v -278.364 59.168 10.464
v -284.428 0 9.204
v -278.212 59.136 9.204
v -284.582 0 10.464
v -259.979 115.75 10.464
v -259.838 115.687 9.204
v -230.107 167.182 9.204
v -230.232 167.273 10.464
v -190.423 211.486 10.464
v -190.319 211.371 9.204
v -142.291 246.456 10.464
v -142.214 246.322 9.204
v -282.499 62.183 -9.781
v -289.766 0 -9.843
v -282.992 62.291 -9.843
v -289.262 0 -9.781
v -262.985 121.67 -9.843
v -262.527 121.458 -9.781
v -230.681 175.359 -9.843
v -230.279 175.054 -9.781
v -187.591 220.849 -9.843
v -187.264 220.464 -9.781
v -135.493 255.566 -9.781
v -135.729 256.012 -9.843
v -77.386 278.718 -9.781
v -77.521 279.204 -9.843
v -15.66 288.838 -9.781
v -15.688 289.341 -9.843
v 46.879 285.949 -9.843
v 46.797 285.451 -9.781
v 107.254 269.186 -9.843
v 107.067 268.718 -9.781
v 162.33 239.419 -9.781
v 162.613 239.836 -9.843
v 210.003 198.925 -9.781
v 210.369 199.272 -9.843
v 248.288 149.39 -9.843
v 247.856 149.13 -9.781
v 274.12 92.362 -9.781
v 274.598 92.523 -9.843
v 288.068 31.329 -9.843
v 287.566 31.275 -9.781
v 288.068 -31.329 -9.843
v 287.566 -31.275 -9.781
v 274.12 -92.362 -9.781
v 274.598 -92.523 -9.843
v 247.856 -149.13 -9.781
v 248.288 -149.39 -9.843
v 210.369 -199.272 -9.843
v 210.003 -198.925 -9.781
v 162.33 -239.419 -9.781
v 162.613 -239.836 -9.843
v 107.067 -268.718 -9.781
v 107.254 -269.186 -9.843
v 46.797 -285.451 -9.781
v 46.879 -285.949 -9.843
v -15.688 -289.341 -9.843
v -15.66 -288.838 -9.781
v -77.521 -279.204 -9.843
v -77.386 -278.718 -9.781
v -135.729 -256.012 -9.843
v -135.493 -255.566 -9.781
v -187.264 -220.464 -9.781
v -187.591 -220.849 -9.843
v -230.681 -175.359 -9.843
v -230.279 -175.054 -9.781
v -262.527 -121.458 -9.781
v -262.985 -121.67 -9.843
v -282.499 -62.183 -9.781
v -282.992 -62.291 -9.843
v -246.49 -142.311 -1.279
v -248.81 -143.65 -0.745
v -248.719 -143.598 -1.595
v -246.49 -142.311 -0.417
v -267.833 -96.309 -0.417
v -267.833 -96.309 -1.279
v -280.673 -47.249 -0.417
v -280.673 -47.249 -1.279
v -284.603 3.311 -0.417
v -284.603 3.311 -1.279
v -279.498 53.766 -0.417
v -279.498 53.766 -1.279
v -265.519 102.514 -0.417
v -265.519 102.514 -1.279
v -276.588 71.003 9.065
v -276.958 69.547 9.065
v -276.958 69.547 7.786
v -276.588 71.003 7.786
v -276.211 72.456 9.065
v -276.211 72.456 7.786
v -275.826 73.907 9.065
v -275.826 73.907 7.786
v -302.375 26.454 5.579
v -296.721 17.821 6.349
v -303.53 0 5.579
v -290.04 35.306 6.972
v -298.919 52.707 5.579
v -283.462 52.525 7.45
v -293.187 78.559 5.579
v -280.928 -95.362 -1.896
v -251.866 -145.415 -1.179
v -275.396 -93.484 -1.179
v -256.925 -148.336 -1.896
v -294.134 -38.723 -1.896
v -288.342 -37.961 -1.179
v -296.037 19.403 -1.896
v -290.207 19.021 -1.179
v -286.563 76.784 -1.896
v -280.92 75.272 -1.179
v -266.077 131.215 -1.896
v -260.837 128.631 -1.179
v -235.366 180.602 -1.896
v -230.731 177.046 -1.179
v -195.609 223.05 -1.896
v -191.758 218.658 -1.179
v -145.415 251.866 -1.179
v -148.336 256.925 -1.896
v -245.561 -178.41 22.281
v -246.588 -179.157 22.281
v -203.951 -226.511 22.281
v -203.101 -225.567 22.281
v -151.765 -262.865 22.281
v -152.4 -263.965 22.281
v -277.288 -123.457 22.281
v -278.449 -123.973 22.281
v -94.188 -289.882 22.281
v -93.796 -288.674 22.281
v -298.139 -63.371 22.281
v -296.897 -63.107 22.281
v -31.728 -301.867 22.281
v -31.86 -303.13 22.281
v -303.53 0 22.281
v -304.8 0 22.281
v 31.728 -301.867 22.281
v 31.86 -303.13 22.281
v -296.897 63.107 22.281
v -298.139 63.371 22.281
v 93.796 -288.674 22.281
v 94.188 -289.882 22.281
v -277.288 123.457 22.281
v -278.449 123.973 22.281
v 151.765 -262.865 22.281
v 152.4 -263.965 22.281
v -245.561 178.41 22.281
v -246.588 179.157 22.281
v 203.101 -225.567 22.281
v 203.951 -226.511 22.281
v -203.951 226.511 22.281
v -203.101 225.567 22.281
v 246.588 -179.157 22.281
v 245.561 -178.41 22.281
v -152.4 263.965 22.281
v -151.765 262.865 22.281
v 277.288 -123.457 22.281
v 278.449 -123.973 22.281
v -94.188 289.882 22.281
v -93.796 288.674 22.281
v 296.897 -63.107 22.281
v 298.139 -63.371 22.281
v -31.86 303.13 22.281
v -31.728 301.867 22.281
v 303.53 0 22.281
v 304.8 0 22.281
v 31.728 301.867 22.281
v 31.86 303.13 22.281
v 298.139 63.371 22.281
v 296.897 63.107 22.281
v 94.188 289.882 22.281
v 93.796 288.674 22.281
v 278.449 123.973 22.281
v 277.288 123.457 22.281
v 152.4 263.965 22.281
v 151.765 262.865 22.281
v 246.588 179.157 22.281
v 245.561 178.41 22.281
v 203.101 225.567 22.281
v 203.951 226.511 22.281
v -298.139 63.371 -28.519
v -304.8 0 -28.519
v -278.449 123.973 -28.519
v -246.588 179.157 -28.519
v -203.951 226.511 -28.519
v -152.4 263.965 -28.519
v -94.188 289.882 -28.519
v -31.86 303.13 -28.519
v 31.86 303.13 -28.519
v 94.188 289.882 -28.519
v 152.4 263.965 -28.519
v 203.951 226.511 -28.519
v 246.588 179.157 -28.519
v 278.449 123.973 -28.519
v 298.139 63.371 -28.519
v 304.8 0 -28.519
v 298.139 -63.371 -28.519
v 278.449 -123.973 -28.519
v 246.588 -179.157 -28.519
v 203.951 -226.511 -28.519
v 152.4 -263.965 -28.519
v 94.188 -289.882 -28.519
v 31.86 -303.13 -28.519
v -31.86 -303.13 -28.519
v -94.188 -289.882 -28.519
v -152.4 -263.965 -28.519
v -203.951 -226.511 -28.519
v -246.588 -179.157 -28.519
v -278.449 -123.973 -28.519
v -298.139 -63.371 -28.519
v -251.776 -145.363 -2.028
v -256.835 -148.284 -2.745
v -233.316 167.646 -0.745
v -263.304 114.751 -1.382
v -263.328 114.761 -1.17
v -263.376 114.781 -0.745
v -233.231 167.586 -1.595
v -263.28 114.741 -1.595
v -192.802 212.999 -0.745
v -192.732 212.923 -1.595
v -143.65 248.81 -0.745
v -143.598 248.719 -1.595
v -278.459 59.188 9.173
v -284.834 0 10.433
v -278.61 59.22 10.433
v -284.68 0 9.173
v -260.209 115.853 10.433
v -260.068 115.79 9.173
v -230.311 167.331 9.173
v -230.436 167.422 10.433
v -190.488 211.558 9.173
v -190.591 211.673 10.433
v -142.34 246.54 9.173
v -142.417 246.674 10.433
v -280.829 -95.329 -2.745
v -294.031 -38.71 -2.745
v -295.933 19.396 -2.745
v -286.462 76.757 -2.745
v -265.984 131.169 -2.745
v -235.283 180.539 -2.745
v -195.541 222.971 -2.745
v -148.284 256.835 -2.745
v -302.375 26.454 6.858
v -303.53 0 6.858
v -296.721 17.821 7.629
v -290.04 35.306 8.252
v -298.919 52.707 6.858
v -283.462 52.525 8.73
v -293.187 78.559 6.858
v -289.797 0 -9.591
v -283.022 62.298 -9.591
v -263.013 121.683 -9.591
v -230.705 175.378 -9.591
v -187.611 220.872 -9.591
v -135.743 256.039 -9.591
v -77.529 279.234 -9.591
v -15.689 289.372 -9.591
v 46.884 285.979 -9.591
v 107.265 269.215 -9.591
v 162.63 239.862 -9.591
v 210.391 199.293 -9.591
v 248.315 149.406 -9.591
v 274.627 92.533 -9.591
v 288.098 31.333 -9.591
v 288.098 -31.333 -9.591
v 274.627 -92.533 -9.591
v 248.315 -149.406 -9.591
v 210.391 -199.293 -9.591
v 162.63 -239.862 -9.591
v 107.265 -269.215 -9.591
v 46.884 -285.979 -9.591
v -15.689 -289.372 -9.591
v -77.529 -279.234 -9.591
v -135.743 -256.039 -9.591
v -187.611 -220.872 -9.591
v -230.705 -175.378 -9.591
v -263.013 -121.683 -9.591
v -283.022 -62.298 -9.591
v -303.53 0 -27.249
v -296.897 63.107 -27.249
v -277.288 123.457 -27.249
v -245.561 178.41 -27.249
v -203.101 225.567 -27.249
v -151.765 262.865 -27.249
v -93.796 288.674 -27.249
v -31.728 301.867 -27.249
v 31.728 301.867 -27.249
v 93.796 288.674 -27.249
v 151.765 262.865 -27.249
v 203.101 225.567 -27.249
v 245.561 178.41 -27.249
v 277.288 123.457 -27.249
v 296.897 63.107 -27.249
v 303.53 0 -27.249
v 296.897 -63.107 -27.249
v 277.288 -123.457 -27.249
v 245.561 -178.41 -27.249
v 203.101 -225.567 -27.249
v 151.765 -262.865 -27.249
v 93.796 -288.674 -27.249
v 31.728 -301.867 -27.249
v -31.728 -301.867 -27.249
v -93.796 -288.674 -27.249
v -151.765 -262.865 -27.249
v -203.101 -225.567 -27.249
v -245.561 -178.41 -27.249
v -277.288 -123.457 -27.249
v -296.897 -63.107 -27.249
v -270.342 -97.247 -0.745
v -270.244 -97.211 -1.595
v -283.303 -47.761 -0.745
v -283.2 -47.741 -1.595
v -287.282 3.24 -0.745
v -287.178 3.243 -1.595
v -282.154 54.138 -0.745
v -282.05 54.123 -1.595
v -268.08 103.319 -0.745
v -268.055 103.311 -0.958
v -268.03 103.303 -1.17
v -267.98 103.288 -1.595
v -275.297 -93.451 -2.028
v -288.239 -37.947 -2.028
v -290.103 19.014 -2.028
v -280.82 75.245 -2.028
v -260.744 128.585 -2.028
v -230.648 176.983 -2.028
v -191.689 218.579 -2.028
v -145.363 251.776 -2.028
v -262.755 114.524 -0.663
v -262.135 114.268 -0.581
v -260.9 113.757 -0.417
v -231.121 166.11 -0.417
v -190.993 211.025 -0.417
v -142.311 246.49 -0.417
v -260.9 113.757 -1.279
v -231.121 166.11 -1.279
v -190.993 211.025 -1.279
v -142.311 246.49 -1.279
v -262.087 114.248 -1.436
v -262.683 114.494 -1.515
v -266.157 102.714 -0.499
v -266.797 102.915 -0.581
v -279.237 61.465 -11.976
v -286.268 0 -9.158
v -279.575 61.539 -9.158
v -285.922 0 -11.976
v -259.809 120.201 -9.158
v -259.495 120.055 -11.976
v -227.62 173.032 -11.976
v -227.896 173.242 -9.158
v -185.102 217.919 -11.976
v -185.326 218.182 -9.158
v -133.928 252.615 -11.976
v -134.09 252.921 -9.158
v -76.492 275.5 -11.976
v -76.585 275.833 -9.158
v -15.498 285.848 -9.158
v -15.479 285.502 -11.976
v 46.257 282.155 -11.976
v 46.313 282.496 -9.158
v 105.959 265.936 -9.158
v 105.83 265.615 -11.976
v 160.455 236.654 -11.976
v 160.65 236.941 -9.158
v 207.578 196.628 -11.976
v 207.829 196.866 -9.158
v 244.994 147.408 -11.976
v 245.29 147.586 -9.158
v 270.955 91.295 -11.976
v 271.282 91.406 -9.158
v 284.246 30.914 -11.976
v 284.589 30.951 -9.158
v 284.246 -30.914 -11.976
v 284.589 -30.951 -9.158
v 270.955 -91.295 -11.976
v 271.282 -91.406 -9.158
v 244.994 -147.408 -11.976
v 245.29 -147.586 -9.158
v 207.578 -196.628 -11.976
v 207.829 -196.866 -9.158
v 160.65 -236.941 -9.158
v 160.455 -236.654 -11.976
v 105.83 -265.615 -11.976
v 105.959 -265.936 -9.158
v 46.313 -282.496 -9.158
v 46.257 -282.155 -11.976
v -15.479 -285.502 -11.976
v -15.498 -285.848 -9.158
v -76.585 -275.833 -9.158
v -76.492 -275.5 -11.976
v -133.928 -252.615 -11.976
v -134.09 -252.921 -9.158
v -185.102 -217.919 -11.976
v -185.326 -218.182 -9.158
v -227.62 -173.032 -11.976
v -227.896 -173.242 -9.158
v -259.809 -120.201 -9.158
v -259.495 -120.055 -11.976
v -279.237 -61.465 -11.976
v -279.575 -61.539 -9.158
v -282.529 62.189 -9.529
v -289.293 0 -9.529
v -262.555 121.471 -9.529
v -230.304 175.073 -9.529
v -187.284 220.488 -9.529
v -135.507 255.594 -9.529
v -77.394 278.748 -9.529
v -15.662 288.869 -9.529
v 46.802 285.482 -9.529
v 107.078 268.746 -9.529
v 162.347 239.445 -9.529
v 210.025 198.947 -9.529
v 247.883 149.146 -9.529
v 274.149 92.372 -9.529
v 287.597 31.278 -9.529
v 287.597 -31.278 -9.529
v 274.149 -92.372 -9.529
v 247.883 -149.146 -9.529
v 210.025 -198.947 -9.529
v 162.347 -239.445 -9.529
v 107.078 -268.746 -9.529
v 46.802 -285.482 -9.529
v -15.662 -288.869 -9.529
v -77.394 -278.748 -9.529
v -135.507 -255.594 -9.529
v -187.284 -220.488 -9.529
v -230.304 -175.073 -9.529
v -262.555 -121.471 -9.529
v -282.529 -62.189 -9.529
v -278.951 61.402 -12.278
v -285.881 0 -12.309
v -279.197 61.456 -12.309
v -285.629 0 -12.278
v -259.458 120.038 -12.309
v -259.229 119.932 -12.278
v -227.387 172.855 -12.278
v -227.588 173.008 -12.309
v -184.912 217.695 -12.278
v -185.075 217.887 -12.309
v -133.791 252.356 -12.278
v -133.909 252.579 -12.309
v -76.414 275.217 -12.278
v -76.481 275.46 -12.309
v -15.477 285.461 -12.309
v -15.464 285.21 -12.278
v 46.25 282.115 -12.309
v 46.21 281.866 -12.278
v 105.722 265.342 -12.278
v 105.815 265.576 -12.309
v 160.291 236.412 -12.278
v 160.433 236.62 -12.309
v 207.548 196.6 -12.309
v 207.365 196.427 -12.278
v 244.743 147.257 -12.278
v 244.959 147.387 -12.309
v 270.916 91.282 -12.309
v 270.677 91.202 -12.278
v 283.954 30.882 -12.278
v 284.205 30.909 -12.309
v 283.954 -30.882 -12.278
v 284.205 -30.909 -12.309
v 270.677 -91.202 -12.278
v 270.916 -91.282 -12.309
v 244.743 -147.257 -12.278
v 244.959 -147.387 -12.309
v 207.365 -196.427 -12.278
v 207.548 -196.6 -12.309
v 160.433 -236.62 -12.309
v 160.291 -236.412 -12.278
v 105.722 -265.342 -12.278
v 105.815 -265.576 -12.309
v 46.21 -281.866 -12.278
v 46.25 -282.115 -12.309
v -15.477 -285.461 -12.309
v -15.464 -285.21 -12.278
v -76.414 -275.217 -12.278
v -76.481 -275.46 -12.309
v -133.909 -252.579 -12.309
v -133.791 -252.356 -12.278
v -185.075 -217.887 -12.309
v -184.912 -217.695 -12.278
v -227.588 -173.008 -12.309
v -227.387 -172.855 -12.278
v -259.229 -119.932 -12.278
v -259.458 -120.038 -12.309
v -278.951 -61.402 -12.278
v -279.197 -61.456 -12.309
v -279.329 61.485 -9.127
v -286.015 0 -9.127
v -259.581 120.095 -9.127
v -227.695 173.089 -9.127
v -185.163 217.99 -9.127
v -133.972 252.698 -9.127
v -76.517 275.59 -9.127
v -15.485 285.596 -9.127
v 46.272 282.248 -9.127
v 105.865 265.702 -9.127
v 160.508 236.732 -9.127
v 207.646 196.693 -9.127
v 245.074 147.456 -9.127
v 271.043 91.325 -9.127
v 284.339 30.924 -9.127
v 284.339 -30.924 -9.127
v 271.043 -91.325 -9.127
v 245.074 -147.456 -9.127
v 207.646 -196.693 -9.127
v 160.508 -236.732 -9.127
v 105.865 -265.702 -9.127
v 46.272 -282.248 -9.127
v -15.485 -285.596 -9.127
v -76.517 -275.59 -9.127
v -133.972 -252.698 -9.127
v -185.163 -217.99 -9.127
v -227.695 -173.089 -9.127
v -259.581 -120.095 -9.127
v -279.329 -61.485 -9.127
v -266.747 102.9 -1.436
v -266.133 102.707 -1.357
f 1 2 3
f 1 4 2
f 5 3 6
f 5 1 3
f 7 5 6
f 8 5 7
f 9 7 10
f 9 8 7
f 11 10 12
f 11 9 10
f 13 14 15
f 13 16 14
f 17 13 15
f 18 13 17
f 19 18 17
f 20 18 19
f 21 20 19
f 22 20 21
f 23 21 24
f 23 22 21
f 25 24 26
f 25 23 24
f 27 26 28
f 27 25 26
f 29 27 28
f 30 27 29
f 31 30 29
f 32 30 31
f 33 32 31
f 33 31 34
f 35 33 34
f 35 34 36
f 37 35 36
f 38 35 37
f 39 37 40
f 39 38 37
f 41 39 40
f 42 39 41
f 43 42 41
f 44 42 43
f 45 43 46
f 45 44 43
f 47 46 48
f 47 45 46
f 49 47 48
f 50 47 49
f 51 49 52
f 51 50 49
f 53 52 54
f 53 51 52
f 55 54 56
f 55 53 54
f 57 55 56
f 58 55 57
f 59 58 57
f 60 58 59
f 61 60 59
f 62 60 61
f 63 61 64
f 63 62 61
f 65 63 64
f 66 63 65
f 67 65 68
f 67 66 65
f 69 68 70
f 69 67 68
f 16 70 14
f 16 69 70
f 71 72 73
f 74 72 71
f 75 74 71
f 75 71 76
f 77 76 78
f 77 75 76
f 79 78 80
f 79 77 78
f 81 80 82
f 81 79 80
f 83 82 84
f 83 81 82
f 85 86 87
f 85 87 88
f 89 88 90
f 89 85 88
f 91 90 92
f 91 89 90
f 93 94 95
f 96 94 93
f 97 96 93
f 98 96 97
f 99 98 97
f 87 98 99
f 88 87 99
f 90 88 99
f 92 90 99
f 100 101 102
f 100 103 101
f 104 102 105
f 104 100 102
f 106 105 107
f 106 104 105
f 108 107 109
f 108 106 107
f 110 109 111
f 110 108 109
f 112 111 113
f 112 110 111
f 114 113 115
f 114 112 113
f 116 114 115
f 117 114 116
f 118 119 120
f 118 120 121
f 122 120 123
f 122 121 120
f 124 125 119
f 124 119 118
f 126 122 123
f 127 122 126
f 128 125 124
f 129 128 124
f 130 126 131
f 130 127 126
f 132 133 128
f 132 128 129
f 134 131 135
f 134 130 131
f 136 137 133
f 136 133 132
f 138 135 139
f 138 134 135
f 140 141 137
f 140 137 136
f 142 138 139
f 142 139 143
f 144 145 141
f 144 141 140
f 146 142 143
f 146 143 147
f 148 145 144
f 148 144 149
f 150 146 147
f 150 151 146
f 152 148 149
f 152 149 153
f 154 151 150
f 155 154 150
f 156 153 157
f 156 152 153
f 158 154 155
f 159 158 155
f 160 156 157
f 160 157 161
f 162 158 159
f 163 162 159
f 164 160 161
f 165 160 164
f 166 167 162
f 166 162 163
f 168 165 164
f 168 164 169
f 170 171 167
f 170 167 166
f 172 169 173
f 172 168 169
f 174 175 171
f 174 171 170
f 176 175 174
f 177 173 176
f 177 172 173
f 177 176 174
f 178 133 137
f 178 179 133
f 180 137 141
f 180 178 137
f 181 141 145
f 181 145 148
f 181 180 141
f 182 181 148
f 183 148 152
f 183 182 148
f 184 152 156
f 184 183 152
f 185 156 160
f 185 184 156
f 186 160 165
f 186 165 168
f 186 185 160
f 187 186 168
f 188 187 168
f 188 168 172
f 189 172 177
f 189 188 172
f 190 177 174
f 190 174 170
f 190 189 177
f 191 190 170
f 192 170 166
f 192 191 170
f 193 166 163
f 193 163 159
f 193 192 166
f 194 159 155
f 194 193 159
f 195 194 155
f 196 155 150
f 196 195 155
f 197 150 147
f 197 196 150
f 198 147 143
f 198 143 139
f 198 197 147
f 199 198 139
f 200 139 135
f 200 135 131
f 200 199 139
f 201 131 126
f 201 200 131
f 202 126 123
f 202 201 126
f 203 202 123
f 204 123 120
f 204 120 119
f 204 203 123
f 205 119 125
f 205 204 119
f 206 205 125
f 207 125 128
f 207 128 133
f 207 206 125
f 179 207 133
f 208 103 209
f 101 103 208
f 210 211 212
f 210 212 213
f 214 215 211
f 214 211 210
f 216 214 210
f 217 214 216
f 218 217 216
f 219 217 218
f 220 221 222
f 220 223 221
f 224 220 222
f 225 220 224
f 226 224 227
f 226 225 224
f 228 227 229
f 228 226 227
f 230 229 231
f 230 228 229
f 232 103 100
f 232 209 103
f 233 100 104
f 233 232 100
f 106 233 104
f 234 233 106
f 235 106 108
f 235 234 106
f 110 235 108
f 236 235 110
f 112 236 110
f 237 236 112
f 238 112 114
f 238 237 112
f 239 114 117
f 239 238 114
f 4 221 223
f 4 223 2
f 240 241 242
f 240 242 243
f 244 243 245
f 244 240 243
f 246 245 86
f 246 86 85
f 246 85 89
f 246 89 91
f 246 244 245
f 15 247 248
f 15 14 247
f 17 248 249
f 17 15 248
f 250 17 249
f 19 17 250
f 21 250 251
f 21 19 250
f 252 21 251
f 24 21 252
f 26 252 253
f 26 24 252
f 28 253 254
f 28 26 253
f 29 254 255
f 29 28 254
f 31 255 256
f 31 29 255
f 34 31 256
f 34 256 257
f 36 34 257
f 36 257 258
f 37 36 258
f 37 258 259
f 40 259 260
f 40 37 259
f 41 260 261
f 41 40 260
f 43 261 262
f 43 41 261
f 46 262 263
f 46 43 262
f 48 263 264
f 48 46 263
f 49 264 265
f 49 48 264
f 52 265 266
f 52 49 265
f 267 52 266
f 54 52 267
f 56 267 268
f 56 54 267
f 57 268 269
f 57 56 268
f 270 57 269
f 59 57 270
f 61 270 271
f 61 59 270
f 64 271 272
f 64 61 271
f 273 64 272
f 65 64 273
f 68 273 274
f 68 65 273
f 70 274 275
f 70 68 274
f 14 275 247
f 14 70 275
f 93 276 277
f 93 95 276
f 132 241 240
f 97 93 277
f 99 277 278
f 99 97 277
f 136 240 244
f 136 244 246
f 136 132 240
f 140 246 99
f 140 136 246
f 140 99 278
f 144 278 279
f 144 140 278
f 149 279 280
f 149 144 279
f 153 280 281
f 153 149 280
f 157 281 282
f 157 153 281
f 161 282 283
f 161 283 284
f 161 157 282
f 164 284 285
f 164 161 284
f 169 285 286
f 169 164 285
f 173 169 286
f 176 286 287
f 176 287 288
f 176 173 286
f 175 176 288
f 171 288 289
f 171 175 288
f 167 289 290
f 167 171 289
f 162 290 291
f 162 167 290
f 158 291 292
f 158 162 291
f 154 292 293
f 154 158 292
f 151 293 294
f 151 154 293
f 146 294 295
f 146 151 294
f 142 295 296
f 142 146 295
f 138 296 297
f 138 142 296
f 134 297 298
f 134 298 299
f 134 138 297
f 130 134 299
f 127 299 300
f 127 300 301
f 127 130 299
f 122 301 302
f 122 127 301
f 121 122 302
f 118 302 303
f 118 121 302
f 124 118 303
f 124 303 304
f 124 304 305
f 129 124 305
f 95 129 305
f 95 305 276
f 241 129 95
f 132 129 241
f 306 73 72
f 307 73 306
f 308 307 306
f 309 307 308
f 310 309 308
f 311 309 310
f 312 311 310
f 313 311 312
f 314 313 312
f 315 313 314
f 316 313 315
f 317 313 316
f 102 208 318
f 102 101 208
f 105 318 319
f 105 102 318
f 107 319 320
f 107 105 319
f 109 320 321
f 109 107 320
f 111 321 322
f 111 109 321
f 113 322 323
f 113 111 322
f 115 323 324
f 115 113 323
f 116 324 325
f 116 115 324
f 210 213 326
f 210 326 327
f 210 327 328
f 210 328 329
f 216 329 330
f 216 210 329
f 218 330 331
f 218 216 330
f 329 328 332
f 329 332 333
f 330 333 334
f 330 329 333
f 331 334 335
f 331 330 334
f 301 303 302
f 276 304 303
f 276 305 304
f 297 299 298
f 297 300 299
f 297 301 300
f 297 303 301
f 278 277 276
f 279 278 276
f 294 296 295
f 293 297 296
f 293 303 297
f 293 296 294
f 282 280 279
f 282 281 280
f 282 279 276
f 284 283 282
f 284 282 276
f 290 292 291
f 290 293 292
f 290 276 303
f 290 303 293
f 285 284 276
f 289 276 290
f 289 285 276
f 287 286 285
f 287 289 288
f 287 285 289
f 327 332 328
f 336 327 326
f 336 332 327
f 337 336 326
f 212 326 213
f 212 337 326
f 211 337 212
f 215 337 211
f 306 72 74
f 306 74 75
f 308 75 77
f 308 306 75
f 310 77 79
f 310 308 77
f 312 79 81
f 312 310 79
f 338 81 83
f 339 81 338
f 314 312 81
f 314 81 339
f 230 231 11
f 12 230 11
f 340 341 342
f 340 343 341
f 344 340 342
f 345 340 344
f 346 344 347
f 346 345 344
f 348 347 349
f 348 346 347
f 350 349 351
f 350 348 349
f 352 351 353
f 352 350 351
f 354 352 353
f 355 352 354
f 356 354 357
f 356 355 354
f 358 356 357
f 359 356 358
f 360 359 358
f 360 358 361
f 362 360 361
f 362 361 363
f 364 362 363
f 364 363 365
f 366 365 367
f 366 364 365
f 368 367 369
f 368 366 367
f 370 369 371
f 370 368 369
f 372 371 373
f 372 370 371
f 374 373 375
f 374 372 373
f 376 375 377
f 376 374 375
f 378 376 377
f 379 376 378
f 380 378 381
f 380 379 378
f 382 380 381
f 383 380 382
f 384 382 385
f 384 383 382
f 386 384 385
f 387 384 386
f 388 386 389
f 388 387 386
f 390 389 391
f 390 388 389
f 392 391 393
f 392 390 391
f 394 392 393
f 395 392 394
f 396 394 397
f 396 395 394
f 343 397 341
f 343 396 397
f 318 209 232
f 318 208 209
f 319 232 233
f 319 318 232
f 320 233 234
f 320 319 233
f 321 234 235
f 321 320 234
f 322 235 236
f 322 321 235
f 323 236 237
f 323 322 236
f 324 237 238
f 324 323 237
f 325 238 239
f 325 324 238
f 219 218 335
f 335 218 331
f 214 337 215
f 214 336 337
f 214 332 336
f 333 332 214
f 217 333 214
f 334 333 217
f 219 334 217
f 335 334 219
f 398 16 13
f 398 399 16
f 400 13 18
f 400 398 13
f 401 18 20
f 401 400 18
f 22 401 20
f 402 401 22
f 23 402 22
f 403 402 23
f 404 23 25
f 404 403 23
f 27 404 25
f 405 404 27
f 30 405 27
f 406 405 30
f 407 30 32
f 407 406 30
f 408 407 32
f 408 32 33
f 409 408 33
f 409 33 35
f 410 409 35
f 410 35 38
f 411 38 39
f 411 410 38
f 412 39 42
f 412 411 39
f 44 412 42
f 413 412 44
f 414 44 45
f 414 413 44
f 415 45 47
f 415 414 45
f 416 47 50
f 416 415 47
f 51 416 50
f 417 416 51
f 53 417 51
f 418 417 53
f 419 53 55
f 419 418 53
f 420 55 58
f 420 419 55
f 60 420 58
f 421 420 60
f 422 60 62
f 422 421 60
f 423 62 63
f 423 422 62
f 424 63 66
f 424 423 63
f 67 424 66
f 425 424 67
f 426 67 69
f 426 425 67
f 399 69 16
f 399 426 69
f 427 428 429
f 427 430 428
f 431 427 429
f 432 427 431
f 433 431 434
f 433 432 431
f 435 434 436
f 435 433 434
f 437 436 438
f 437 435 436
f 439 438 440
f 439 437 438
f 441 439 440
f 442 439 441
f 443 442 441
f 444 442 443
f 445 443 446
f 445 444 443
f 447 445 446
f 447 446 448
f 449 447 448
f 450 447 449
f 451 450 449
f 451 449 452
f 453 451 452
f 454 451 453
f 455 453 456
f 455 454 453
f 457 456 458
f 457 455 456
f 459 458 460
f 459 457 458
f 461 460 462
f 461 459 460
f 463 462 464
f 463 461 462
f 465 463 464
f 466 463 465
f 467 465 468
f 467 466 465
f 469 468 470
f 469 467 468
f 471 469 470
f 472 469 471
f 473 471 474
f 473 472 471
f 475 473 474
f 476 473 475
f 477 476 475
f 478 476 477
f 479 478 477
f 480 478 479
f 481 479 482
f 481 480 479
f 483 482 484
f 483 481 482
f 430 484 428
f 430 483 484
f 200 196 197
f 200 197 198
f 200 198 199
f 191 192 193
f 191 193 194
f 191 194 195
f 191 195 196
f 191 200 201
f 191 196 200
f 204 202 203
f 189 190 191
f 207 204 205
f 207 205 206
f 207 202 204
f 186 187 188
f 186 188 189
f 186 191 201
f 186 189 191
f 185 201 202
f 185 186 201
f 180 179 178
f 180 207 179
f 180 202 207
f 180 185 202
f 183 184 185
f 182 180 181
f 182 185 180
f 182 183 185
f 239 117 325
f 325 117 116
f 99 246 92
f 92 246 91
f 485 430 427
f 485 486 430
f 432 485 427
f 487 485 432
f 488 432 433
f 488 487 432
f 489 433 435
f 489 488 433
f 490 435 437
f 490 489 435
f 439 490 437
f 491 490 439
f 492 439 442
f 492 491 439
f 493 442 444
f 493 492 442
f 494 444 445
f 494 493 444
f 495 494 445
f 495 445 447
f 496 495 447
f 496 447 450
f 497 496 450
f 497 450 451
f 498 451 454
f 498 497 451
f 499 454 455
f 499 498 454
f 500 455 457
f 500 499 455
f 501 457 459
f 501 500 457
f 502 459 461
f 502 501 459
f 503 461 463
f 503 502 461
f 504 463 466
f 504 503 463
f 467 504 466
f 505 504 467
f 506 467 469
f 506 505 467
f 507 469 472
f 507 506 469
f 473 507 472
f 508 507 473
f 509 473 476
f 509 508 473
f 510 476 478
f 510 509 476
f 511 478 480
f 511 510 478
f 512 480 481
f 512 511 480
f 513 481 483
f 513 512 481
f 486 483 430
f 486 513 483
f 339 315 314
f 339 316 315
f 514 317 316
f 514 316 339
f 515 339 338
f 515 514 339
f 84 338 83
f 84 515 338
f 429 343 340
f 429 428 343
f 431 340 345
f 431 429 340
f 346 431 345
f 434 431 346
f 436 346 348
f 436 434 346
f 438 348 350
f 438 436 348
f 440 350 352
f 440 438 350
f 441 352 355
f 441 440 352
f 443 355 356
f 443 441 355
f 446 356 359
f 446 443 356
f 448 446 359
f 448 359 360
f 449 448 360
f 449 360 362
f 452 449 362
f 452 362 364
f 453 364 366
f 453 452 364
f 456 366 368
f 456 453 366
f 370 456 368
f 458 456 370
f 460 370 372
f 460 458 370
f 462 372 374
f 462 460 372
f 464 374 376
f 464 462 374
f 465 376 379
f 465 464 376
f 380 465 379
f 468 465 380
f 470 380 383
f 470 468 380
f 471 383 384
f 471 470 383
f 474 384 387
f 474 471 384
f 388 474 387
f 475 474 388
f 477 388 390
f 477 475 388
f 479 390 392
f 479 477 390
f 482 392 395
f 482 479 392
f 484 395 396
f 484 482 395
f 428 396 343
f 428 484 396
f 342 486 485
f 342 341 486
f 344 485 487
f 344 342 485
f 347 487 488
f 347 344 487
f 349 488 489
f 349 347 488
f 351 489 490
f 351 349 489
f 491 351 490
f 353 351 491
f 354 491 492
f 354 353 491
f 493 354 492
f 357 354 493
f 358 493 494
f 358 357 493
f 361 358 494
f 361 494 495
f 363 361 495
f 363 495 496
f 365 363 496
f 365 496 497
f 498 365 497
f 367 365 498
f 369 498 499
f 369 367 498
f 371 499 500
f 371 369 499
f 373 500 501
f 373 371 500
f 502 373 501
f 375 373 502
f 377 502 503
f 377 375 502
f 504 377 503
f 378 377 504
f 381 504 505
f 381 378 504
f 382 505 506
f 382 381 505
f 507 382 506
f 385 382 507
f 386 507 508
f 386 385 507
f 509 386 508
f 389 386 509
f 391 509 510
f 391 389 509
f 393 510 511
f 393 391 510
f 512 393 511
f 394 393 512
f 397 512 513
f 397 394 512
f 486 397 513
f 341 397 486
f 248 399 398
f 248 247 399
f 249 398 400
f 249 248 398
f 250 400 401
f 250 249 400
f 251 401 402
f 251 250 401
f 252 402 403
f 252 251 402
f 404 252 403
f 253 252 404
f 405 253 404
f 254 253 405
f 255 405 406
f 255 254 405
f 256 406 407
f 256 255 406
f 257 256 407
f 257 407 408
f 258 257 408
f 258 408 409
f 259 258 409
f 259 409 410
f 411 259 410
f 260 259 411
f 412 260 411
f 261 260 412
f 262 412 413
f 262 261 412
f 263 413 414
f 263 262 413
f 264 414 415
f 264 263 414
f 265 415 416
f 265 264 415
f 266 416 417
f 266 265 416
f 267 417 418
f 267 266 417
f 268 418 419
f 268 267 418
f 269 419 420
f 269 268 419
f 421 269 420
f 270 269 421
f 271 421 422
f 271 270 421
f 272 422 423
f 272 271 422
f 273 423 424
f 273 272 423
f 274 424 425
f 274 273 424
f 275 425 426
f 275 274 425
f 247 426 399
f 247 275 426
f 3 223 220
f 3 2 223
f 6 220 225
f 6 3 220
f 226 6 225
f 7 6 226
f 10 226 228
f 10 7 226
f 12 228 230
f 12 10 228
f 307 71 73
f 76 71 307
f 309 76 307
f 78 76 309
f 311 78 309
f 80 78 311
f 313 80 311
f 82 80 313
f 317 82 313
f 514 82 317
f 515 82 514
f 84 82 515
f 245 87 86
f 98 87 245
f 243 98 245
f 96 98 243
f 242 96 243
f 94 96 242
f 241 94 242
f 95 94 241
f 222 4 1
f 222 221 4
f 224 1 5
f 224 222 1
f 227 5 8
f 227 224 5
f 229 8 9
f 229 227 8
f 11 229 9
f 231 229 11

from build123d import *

# Parameters (mm, degrees)
F3_ANGLE_BACK = 30
F3_ANGLE      = 90
F5_ANGLE_BACK = 30
F5_ANGLE      = 90
F8_DEPTH      = 50.8
F9_ANGLE      = 60
F11_ANGLE     = 15
F12_DEPTH     = 871


# Not quite as in the source:
# - an extrude ends at something that could not be found from the text; its depth is read off the source's solid
# - a feature names something its author has since deleted; it is built from what else it names


with BuildPart() as f2:
    # F0 (on Front) → F2 (revolve)
    with BuildSketch(Plane.XZ):
        Polygon((-304.8, 22.2812721531), (-304.8, -3.1187278469), (-304.8, -28.5187278469), (0, -28.5187278469), (0, -27.2487278469), (-303.53, -27.2487278469), (-303.53, -4.0932331217), (-303.53, -2.7382071398), (-303.53, 5.5787864694), (-303.53, 6.8583239477), (-303.53, 22.2812721531), align=None)
    revolve(axis=Axis((0, 0, -10.9399985522), (0, 0, -1)))

    # F0 (on Front) → F11 (revolve)
    with BuildSketch(Plane.XZ):
        Polygon((-285.5563602362, 9.0652094139), (-303.53, 6.8583239477), (-303.53, 5.5787864694), (-285.5563602362, 7.7856719356), align=None)
    revolve(axis=Axis((0, 0, -10.9399985522), (0, 0, -1)), revolution_arc=F11_ANGLE)

    # F4 (on face) → F12 (cut, through all)
    with BuildSketch(Plane.XY.offset(-27.2487278469)):
        Polygon((-273.6640274525, 78.1679973006), (-303.53, 0), (-273.6640274525, -3.1685957219), align=None)
    extrude(amount=F12_DEPTH, mode=Mode.SUBTRACT)


with BuildPart() as f3:
    # F0 (on Front) → F3 (revolve)
    with BuildSketch(Plane.XZ, mode=Mode.PRIVATE) as f3_sk:
        Polygon((-290.83, -1.1788432163), (-296.672, -1.8961506211), (-296.5677402466, -2.7452781714), (-290.7257402466, -2.0279707666), align=None)
    revolve(f3_sk.sketch.rotate(Axis((0, 0, -10.9399985522), (0, 0, -1)), -F3_ANGLE_BACK), axis=Axis((0, 0, -10.9399985522), (0, 0, -1)), revolution_arc=F3_ANGLE)


with BuildPart() as f5:
    # F0 (on Front) → F5 (revolve)
    with BuildSketch(Plane.XZ, mode=Mode.PRIVATE) as f5_sk:
        Polygon((-284.6219958112, -1.2785251862), (-284.6219958112, -0.4165961479), (-287.3005058848, -0.7454758312), (-287.1962461314, -1.5946033814), align=None)
    revolve(f5_sk.sketch.rotate(Axis((0, 0, -10.9399985522), (0, 0, -1)), -F5_ANGLE_BACK), axis=Axis((0, 0, -10.9399985522), (0, 0, -1)), revolution_arc=F5_ANGLE)

    # F7 (on face) → F8 (cut)
    with BuildSketch(Plane.XY.offset(-27.2487278469)):
        Polygon((-263.6561095715, 114.8968338966), (-268.4032320976, 103.4207493067), (-263.9383698547, 102.0165755392), (-259.3476270111, 113.1146150174), align=None)
    extrude(amount=F8_DEPTH, mode=Mode.SUBTRACT)


with BuildPart() as f6:
    # F0 (on Front) → F6 (revolve)
    with BuildSketch(Plane.XZ):
        Polygon((-289.2928824048, -9.5292628156), (-289.7970958498, -9.5911724421), (-289.7661410366, -9.8432791646), (-289.2619275916, -9.7813695382), align=None)
    revolve(axis=Axis((0, 0, -10.9399985522), (0, 0, -1)))


with BuildPart() as f9:
    # F0 (on Front) → F9 (revolve)
    with BuildSketch(Plane.XZ):
        Polygon((-284.5823778866, 10.4643368874), (-284.8344846091, 10.4333820742), (-284.6797105429, 9.1728484616), (-284.4276038204, 9.2038032748), align=None)
    revolve(axis=Axis((0, 0, -10.9399985522), (0, 0, -1)), revolution_arc=F9_ANGLE)


with BuildPart() as f10:
    # F0 (on Front) → F10 (revolve)
    with BuildSketch(Plane.XZ):
        Polygon((-286.0154950121, -9.1268502437), (-286.2676017346, -9.1578050569), (-285.9215922653, -11.9758260426), (-285.8806665693, -12.3091390884), (-285.6285598468, -12.2781842752), align=None)
    revolve(axis=Axis((0, 0, -10.9399985522), (0, 0, -1)))


solid = Compound([f2.part, f3.part, f5.part, f6.part, f9.part, f10.part])
